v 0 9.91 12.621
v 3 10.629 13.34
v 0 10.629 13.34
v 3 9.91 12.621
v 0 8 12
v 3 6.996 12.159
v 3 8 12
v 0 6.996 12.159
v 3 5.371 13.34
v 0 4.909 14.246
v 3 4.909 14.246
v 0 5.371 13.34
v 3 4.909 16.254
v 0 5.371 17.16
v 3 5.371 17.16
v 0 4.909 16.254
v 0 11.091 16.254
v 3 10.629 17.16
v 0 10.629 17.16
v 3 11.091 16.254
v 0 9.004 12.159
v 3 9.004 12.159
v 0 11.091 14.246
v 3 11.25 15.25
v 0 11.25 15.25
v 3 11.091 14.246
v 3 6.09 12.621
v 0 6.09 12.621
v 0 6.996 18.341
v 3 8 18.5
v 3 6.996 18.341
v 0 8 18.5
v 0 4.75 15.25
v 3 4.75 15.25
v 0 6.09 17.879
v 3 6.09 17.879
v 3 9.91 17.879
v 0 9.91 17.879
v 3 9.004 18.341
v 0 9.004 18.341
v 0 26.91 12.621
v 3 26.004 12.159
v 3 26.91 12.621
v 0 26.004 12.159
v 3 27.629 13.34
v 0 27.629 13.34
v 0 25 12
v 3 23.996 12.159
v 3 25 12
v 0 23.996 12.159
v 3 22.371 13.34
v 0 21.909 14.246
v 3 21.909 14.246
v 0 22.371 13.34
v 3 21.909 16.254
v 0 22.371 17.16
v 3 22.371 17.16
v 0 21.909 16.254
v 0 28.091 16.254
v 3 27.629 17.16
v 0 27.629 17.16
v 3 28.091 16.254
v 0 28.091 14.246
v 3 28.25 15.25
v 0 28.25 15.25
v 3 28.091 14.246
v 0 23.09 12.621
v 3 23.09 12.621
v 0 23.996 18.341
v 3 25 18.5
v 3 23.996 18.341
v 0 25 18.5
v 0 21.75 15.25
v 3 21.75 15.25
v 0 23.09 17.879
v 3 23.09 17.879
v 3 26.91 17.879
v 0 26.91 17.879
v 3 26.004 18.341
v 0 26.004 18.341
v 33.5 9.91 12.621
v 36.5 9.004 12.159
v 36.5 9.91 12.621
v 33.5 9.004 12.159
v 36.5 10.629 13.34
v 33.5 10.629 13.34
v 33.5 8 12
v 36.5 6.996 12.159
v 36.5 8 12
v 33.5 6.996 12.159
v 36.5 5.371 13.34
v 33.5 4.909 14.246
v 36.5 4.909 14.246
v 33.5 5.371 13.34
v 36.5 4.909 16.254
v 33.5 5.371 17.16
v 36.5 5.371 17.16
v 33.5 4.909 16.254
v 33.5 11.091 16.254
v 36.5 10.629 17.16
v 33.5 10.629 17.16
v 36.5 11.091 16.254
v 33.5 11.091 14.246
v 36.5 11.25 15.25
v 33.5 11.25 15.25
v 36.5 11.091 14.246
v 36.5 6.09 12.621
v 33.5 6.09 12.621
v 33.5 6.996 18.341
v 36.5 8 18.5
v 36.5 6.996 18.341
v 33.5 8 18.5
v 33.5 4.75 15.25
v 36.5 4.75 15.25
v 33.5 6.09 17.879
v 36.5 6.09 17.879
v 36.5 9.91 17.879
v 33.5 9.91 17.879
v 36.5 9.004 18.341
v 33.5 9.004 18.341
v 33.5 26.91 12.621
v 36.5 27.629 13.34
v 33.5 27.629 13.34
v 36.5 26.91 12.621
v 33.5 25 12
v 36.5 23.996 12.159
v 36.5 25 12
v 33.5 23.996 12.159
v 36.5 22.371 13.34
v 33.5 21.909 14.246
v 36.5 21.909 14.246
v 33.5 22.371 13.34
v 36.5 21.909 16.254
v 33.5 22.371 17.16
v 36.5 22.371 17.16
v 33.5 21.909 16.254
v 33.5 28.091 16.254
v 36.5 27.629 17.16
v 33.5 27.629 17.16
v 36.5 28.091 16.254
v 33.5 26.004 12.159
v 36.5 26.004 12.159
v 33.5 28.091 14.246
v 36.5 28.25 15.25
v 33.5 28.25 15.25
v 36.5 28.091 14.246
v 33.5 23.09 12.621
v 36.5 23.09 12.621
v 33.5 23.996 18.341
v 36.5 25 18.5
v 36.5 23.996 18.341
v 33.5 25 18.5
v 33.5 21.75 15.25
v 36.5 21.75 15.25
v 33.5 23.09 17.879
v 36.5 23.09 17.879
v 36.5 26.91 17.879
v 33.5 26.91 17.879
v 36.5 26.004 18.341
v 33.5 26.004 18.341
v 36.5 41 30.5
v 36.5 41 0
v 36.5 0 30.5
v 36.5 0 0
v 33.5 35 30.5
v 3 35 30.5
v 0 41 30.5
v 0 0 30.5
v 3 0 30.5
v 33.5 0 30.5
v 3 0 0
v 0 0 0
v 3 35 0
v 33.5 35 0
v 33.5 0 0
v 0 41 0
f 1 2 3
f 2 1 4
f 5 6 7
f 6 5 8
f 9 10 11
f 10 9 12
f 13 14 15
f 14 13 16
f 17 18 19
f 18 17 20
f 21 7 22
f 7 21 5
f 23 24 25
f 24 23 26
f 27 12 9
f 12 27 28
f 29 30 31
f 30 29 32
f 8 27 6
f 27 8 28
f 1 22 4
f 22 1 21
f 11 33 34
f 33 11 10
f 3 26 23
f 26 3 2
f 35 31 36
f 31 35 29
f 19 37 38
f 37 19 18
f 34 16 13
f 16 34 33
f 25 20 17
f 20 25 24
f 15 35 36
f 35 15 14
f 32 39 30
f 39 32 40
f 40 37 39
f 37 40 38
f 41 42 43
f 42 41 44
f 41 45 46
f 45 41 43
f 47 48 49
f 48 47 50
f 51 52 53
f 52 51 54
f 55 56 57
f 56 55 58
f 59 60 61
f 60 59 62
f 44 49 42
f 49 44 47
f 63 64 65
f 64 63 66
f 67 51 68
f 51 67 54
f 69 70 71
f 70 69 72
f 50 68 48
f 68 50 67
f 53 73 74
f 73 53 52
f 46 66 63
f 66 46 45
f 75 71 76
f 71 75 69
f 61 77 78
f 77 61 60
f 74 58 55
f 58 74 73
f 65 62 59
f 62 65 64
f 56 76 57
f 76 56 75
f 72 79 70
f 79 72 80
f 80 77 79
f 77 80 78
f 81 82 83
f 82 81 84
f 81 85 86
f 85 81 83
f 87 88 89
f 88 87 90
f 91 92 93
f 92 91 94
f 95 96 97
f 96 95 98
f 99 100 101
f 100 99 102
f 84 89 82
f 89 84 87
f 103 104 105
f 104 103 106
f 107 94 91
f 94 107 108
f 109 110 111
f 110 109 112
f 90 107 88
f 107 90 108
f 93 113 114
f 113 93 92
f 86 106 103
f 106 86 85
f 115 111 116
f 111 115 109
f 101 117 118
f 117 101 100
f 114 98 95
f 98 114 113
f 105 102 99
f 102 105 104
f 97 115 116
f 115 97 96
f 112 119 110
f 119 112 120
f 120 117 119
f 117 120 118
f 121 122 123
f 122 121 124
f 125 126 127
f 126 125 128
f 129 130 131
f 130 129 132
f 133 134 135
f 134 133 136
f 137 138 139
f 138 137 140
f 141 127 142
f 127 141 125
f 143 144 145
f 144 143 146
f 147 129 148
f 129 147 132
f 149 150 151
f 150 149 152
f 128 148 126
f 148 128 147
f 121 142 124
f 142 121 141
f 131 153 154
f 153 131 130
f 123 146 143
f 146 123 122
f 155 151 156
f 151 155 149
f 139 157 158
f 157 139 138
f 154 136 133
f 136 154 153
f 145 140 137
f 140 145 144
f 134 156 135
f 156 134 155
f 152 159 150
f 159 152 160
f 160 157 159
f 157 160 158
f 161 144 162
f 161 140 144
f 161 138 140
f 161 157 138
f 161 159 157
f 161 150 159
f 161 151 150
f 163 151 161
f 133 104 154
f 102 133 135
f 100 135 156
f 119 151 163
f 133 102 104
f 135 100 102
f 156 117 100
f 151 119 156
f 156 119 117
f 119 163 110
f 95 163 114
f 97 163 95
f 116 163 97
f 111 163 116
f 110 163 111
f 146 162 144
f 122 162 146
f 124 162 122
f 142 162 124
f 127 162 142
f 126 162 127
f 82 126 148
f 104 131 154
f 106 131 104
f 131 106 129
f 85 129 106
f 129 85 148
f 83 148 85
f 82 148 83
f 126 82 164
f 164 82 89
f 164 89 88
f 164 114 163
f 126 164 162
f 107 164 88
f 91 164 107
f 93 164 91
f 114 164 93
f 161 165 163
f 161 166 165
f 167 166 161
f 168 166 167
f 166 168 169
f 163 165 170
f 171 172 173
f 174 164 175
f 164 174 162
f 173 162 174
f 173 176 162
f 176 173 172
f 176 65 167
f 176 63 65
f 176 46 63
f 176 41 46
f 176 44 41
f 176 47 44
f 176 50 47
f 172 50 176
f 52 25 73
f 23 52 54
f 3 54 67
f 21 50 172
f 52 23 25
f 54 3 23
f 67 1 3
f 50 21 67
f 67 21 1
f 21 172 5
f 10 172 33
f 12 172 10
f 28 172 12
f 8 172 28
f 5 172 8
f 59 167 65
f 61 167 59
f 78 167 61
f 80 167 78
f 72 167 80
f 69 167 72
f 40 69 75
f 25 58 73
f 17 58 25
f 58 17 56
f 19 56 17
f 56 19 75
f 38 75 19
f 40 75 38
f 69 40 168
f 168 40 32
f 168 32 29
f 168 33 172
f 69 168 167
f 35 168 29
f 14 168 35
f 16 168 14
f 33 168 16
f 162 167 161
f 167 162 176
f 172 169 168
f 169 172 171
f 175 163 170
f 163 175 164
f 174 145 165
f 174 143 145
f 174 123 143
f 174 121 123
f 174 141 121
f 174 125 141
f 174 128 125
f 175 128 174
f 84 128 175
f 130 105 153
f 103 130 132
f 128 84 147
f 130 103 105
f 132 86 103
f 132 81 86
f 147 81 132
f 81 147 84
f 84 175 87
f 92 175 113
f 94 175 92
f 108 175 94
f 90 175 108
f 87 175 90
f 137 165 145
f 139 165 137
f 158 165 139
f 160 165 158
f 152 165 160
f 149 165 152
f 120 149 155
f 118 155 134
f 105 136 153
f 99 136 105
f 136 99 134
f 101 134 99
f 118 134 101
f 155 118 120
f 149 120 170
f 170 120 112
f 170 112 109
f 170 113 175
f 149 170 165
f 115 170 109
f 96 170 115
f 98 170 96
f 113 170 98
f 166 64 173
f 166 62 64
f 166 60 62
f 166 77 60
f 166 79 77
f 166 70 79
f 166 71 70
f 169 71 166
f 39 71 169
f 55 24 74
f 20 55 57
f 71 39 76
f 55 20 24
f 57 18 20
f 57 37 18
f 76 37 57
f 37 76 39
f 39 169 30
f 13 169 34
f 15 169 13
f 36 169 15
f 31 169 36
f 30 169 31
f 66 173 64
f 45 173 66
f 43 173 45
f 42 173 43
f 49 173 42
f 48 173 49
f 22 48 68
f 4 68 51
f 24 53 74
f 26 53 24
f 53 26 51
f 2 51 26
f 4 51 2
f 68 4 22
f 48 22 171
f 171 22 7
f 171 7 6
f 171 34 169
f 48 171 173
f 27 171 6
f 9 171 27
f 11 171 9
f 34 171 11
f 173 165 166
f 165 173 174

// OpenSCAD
// file: ../../parameters.scad
maximum_printable_size = 150;

layer_thickness = 0.3;
global_clearance = 0.5;


//Screw diameter and nut for M10 [mm]
M10_screw_diameter = 10.4;
M10_head_height = 10;
M10_head_diameter = 16+0.5;
M10_nut_height = 10.5;
M10_nut_diameter = 25.5;
M10_nut_pocket = 22.3;

//Screw diameter for M8 [mm]
M8_screw_diameter = 8.6;
M8_head_height = 8;
M8_head_diameter = 13.5;
M8_nut_height = 7.5;
M8_square_nut_thin_height = 4.5;
M8_nut_diameter = 14.4 + 0.5;
M8_nut_pocket = 13 + 0.5;
M8_washer_diameter = 16;
M8_washer_thickness = 1.5;


//Screw diameter and nut for M6 [mm]
M6_screw_diameter=6.5;
M6_head_diameter = 10+0.5;
M6_head_height = 6;
M6_nut_height = 4.9;
M6_nut_diameter = 11.8;
M6_nut_pocket = 10.4;
M6_square_nut_height = 3;
M6_square_nut_diameter = 10;
M6_washer_thickness = 1.6;

//Screw diameter and nut for M5 [mm]
M5_screw_diameter=5.5;
M5_head_height = 5;
M5_head_diameter = 13+0.5;
M5_nut_height = 4.5;
M5_nut_diameter = 9.4;
M5_nut_pocket = 8.4;

//Screw diameter and nut for M4 [mm]
M4_screw_diameter=4.5;
M4_screw_head_height = 4;
M4_nut_height = 3.2;
M4_nut_diameter = 8.4;
M4_nut_pocket = 7.5;

//Screw diameter and nut for M3 [mm]
M3_screw_diameter = 3.2;
M3_nut_height = 2.7;
M3_nut_diameter = 6.6;
M3_nut_pocket = 5.6;
M3_screw_head_height = 3;

//Screw diameter and nut for M2,5 [mm]
M2_5_screw_diameter = 2.7;
M2_5_nut_height = 2.3;
M2_5_nut_diameter = 6;
M2_5_nut_pocket = 5.5;

// kulove lozisko

bearing_efsm_08_h = 33+1;
bearing_efsm_08_m = 22;
bearing_efsm_08_db = 18;
bearing_efsm_08_ag = 10.5;
bearing_efsm_08_n = M4_screw_diameter;
bearing_efsm_08_a1 = 5.5;
bearing_efsm_08_d = 8.25;
bearing_efsm_08_B = 8; // ball height

bearing_efsm_10_h = 38+1;
bearing_efsm_10_m = 26;
bearing_efsm_10_db = 21.9;
bearing_efsm_10_ag = 12+0.2;
bearing_efsm_10_n = M5_screw_diameter;
bearing_efsm_10_a1 = 6.5;
bearing_efsm_10_d = 10.25;


bearing_efsm_12_width = 40+1;
bearing_efsm_12_h = bearing_efsm_12_width;
bearing_efsm_12_boltd = 28/2; // polovina vzdalenosti mezi srouby
bearing_efsm_12_m = bearing_efsm_12_boltd*2;
bearing_efsm_12_db = 25;
bearing_efsm_12_ag = 13;
bearing_efsm_12_a1 = 7;
bearing_efsm_12_n = M5_screw_diameter;
bearing_efsm_12_d = 12.15;
bearing_efsm_12_B = 10; // ball height
bearing_efsm_space = 1;

bearing_efsm_17_width = 54+1;
bearing_efsm_17_h = bearing_efsm_17_width;
bearing_efsm_17_boltd = 38/2; // polovina vzdalenosti mezi srouby
bearing_efsm_17_m = bearing_efsm_17_boltd*2;
bearing_efsm_17_db = 35;
bearing_efsm_17_ag = 18;
bearing_efsm_17_n = M6_screw_diameter;
bearing_efsm_17_a1 = 10;
bearing_efsm_17_B = 17; // ball height

//limcove lozisko
bearing_EFOM_10_L=26; //celkova sirka zakladny
bearing_EFOM_10_d1=10.3;//diametr otvoru real=10 mm
bearing_EFOM_10_dB=22;//diametr vystupku pro ulozeni lozika
bearing_EFOM_10_H=52;//celková delka zakladny
bearing_EFOM_10_J=36;// hole pitch
bearing_EFOM_10_A1=6.5;//vyska pouzdra
bearing_EFOM_10_Ag=12;//celkova vyska
bearing_EFOM_10_N1=5;//sirka otvoru pro sroub
bearing_EFOM_10_N2=8;//delka otvoru pro sroub
bearing_EFOM_10_m=36;//roztec der pro sroub
bearing_EFOM_10_h=9;//vyska lozika


608_bearing_outer_diameter = 22.3;
608_bearing_inner_diameter = 16;
608_bearing_thickness = 7.1;


// 20 KG servo parameters

servo_20kg_axis_offset = 9.375; // jak je osa mimo stredu
servo_20kg_body_x = 42;
servo_20kg_body_y = 21;
servo_20kg_body_z = 40;
servo_20kg_thread_x = 49/2;
servo_20kg_thread_y = 10/2;
servo_20kg_body_below = 10; // jak hluboko je tělo serva pod drzaky na srouby
servo_20kg_below = 25.8; // jak hluboko je páka serva pod drzaky na srouby

servo_20kg_bolt_d = 2.5+0.3;
servo_20kg_nut_d = 5+0.3;


//strain gauge
strain_gauge_width = 12.7;
strain_gauge_length = 75.1;
strain_gauge_screw_distance = 10;

//ALU profile
ALU_profile_width = 30.5;
ALU_profile_holder_wall_thickness = 3;
ALU_profile_groove_width = 8;

//pillow block bearing
//https://www.igus.eu/product/372
//Part no. KSTM-08
KSTM08_screws_distance = 33;         //m
KSTM08_screws_holes_diameter = 4.5;  //d2
KSTM08_flange_thickness = 6;         //h3
KSTM08_case_width = 9;               //C1
KSTM08_case_length = 47;             //a
KSTM08_ball_width = 12;              //B
KSTM08_ball_hole_diameter = 7.85;    //d1


//ložiska pro malý rotor
bearing_outer_diameter = 10.2;    // Rozměr B1 v nákresu s přídavkem na toleranci otvoru
bearing_thickness = 4;        // Rozměr B2 v nákresu
//bearing_shaft_length = 19.5;    // Rozměr B3 v nákresu, Originalni hodnota 19.5
bearing_shaft_length = 20;    // Rozměr B3 v nákresu


//simple platform parameters
front_holder_width = 160;
front_holder_angle = 25;
front_holder_height = 60;
front_holder_offset = 15;
// main file
include <../../parameters.scad>



module ALU_profile_holder_top(deep=35) {
    wall_thickness = ALU_profile_holder_wall_thickness;
    
    module screw_holes() {
        translate([wall_thickness/2, 8, ALU_profile_width/2]) {
            rotate([0, 90, 0]) 
                cylinder(d=M6_screw_diameter, h=wall_thickness*2, center=true, $fn=20);
        }
        translate([wall_thickness/2, deep-10, ALU_profile_width/2]) {
                rotate([0, 90, 0])
                cylinder(d=M6_screw_diameter, h=wall_thickness*2, center=true, $fn=20);
            
        }
    }
    
    difference() {
        cube([ALU_profile_width+wall_thickness*2, deep+wall_thickness*2, ALU_profile_width]);
        translate([wall_thickness, -0.1, -0.1])
            cube([ALU_profile_width, deep+0.1, ALU_profile_width+0.2]);
        
        screw_holes();
        translate([ALU_profile_width+wall_thickness, 0, 0])
            screw_holes();
    }
}

ALU_profile_holder_top(35);
